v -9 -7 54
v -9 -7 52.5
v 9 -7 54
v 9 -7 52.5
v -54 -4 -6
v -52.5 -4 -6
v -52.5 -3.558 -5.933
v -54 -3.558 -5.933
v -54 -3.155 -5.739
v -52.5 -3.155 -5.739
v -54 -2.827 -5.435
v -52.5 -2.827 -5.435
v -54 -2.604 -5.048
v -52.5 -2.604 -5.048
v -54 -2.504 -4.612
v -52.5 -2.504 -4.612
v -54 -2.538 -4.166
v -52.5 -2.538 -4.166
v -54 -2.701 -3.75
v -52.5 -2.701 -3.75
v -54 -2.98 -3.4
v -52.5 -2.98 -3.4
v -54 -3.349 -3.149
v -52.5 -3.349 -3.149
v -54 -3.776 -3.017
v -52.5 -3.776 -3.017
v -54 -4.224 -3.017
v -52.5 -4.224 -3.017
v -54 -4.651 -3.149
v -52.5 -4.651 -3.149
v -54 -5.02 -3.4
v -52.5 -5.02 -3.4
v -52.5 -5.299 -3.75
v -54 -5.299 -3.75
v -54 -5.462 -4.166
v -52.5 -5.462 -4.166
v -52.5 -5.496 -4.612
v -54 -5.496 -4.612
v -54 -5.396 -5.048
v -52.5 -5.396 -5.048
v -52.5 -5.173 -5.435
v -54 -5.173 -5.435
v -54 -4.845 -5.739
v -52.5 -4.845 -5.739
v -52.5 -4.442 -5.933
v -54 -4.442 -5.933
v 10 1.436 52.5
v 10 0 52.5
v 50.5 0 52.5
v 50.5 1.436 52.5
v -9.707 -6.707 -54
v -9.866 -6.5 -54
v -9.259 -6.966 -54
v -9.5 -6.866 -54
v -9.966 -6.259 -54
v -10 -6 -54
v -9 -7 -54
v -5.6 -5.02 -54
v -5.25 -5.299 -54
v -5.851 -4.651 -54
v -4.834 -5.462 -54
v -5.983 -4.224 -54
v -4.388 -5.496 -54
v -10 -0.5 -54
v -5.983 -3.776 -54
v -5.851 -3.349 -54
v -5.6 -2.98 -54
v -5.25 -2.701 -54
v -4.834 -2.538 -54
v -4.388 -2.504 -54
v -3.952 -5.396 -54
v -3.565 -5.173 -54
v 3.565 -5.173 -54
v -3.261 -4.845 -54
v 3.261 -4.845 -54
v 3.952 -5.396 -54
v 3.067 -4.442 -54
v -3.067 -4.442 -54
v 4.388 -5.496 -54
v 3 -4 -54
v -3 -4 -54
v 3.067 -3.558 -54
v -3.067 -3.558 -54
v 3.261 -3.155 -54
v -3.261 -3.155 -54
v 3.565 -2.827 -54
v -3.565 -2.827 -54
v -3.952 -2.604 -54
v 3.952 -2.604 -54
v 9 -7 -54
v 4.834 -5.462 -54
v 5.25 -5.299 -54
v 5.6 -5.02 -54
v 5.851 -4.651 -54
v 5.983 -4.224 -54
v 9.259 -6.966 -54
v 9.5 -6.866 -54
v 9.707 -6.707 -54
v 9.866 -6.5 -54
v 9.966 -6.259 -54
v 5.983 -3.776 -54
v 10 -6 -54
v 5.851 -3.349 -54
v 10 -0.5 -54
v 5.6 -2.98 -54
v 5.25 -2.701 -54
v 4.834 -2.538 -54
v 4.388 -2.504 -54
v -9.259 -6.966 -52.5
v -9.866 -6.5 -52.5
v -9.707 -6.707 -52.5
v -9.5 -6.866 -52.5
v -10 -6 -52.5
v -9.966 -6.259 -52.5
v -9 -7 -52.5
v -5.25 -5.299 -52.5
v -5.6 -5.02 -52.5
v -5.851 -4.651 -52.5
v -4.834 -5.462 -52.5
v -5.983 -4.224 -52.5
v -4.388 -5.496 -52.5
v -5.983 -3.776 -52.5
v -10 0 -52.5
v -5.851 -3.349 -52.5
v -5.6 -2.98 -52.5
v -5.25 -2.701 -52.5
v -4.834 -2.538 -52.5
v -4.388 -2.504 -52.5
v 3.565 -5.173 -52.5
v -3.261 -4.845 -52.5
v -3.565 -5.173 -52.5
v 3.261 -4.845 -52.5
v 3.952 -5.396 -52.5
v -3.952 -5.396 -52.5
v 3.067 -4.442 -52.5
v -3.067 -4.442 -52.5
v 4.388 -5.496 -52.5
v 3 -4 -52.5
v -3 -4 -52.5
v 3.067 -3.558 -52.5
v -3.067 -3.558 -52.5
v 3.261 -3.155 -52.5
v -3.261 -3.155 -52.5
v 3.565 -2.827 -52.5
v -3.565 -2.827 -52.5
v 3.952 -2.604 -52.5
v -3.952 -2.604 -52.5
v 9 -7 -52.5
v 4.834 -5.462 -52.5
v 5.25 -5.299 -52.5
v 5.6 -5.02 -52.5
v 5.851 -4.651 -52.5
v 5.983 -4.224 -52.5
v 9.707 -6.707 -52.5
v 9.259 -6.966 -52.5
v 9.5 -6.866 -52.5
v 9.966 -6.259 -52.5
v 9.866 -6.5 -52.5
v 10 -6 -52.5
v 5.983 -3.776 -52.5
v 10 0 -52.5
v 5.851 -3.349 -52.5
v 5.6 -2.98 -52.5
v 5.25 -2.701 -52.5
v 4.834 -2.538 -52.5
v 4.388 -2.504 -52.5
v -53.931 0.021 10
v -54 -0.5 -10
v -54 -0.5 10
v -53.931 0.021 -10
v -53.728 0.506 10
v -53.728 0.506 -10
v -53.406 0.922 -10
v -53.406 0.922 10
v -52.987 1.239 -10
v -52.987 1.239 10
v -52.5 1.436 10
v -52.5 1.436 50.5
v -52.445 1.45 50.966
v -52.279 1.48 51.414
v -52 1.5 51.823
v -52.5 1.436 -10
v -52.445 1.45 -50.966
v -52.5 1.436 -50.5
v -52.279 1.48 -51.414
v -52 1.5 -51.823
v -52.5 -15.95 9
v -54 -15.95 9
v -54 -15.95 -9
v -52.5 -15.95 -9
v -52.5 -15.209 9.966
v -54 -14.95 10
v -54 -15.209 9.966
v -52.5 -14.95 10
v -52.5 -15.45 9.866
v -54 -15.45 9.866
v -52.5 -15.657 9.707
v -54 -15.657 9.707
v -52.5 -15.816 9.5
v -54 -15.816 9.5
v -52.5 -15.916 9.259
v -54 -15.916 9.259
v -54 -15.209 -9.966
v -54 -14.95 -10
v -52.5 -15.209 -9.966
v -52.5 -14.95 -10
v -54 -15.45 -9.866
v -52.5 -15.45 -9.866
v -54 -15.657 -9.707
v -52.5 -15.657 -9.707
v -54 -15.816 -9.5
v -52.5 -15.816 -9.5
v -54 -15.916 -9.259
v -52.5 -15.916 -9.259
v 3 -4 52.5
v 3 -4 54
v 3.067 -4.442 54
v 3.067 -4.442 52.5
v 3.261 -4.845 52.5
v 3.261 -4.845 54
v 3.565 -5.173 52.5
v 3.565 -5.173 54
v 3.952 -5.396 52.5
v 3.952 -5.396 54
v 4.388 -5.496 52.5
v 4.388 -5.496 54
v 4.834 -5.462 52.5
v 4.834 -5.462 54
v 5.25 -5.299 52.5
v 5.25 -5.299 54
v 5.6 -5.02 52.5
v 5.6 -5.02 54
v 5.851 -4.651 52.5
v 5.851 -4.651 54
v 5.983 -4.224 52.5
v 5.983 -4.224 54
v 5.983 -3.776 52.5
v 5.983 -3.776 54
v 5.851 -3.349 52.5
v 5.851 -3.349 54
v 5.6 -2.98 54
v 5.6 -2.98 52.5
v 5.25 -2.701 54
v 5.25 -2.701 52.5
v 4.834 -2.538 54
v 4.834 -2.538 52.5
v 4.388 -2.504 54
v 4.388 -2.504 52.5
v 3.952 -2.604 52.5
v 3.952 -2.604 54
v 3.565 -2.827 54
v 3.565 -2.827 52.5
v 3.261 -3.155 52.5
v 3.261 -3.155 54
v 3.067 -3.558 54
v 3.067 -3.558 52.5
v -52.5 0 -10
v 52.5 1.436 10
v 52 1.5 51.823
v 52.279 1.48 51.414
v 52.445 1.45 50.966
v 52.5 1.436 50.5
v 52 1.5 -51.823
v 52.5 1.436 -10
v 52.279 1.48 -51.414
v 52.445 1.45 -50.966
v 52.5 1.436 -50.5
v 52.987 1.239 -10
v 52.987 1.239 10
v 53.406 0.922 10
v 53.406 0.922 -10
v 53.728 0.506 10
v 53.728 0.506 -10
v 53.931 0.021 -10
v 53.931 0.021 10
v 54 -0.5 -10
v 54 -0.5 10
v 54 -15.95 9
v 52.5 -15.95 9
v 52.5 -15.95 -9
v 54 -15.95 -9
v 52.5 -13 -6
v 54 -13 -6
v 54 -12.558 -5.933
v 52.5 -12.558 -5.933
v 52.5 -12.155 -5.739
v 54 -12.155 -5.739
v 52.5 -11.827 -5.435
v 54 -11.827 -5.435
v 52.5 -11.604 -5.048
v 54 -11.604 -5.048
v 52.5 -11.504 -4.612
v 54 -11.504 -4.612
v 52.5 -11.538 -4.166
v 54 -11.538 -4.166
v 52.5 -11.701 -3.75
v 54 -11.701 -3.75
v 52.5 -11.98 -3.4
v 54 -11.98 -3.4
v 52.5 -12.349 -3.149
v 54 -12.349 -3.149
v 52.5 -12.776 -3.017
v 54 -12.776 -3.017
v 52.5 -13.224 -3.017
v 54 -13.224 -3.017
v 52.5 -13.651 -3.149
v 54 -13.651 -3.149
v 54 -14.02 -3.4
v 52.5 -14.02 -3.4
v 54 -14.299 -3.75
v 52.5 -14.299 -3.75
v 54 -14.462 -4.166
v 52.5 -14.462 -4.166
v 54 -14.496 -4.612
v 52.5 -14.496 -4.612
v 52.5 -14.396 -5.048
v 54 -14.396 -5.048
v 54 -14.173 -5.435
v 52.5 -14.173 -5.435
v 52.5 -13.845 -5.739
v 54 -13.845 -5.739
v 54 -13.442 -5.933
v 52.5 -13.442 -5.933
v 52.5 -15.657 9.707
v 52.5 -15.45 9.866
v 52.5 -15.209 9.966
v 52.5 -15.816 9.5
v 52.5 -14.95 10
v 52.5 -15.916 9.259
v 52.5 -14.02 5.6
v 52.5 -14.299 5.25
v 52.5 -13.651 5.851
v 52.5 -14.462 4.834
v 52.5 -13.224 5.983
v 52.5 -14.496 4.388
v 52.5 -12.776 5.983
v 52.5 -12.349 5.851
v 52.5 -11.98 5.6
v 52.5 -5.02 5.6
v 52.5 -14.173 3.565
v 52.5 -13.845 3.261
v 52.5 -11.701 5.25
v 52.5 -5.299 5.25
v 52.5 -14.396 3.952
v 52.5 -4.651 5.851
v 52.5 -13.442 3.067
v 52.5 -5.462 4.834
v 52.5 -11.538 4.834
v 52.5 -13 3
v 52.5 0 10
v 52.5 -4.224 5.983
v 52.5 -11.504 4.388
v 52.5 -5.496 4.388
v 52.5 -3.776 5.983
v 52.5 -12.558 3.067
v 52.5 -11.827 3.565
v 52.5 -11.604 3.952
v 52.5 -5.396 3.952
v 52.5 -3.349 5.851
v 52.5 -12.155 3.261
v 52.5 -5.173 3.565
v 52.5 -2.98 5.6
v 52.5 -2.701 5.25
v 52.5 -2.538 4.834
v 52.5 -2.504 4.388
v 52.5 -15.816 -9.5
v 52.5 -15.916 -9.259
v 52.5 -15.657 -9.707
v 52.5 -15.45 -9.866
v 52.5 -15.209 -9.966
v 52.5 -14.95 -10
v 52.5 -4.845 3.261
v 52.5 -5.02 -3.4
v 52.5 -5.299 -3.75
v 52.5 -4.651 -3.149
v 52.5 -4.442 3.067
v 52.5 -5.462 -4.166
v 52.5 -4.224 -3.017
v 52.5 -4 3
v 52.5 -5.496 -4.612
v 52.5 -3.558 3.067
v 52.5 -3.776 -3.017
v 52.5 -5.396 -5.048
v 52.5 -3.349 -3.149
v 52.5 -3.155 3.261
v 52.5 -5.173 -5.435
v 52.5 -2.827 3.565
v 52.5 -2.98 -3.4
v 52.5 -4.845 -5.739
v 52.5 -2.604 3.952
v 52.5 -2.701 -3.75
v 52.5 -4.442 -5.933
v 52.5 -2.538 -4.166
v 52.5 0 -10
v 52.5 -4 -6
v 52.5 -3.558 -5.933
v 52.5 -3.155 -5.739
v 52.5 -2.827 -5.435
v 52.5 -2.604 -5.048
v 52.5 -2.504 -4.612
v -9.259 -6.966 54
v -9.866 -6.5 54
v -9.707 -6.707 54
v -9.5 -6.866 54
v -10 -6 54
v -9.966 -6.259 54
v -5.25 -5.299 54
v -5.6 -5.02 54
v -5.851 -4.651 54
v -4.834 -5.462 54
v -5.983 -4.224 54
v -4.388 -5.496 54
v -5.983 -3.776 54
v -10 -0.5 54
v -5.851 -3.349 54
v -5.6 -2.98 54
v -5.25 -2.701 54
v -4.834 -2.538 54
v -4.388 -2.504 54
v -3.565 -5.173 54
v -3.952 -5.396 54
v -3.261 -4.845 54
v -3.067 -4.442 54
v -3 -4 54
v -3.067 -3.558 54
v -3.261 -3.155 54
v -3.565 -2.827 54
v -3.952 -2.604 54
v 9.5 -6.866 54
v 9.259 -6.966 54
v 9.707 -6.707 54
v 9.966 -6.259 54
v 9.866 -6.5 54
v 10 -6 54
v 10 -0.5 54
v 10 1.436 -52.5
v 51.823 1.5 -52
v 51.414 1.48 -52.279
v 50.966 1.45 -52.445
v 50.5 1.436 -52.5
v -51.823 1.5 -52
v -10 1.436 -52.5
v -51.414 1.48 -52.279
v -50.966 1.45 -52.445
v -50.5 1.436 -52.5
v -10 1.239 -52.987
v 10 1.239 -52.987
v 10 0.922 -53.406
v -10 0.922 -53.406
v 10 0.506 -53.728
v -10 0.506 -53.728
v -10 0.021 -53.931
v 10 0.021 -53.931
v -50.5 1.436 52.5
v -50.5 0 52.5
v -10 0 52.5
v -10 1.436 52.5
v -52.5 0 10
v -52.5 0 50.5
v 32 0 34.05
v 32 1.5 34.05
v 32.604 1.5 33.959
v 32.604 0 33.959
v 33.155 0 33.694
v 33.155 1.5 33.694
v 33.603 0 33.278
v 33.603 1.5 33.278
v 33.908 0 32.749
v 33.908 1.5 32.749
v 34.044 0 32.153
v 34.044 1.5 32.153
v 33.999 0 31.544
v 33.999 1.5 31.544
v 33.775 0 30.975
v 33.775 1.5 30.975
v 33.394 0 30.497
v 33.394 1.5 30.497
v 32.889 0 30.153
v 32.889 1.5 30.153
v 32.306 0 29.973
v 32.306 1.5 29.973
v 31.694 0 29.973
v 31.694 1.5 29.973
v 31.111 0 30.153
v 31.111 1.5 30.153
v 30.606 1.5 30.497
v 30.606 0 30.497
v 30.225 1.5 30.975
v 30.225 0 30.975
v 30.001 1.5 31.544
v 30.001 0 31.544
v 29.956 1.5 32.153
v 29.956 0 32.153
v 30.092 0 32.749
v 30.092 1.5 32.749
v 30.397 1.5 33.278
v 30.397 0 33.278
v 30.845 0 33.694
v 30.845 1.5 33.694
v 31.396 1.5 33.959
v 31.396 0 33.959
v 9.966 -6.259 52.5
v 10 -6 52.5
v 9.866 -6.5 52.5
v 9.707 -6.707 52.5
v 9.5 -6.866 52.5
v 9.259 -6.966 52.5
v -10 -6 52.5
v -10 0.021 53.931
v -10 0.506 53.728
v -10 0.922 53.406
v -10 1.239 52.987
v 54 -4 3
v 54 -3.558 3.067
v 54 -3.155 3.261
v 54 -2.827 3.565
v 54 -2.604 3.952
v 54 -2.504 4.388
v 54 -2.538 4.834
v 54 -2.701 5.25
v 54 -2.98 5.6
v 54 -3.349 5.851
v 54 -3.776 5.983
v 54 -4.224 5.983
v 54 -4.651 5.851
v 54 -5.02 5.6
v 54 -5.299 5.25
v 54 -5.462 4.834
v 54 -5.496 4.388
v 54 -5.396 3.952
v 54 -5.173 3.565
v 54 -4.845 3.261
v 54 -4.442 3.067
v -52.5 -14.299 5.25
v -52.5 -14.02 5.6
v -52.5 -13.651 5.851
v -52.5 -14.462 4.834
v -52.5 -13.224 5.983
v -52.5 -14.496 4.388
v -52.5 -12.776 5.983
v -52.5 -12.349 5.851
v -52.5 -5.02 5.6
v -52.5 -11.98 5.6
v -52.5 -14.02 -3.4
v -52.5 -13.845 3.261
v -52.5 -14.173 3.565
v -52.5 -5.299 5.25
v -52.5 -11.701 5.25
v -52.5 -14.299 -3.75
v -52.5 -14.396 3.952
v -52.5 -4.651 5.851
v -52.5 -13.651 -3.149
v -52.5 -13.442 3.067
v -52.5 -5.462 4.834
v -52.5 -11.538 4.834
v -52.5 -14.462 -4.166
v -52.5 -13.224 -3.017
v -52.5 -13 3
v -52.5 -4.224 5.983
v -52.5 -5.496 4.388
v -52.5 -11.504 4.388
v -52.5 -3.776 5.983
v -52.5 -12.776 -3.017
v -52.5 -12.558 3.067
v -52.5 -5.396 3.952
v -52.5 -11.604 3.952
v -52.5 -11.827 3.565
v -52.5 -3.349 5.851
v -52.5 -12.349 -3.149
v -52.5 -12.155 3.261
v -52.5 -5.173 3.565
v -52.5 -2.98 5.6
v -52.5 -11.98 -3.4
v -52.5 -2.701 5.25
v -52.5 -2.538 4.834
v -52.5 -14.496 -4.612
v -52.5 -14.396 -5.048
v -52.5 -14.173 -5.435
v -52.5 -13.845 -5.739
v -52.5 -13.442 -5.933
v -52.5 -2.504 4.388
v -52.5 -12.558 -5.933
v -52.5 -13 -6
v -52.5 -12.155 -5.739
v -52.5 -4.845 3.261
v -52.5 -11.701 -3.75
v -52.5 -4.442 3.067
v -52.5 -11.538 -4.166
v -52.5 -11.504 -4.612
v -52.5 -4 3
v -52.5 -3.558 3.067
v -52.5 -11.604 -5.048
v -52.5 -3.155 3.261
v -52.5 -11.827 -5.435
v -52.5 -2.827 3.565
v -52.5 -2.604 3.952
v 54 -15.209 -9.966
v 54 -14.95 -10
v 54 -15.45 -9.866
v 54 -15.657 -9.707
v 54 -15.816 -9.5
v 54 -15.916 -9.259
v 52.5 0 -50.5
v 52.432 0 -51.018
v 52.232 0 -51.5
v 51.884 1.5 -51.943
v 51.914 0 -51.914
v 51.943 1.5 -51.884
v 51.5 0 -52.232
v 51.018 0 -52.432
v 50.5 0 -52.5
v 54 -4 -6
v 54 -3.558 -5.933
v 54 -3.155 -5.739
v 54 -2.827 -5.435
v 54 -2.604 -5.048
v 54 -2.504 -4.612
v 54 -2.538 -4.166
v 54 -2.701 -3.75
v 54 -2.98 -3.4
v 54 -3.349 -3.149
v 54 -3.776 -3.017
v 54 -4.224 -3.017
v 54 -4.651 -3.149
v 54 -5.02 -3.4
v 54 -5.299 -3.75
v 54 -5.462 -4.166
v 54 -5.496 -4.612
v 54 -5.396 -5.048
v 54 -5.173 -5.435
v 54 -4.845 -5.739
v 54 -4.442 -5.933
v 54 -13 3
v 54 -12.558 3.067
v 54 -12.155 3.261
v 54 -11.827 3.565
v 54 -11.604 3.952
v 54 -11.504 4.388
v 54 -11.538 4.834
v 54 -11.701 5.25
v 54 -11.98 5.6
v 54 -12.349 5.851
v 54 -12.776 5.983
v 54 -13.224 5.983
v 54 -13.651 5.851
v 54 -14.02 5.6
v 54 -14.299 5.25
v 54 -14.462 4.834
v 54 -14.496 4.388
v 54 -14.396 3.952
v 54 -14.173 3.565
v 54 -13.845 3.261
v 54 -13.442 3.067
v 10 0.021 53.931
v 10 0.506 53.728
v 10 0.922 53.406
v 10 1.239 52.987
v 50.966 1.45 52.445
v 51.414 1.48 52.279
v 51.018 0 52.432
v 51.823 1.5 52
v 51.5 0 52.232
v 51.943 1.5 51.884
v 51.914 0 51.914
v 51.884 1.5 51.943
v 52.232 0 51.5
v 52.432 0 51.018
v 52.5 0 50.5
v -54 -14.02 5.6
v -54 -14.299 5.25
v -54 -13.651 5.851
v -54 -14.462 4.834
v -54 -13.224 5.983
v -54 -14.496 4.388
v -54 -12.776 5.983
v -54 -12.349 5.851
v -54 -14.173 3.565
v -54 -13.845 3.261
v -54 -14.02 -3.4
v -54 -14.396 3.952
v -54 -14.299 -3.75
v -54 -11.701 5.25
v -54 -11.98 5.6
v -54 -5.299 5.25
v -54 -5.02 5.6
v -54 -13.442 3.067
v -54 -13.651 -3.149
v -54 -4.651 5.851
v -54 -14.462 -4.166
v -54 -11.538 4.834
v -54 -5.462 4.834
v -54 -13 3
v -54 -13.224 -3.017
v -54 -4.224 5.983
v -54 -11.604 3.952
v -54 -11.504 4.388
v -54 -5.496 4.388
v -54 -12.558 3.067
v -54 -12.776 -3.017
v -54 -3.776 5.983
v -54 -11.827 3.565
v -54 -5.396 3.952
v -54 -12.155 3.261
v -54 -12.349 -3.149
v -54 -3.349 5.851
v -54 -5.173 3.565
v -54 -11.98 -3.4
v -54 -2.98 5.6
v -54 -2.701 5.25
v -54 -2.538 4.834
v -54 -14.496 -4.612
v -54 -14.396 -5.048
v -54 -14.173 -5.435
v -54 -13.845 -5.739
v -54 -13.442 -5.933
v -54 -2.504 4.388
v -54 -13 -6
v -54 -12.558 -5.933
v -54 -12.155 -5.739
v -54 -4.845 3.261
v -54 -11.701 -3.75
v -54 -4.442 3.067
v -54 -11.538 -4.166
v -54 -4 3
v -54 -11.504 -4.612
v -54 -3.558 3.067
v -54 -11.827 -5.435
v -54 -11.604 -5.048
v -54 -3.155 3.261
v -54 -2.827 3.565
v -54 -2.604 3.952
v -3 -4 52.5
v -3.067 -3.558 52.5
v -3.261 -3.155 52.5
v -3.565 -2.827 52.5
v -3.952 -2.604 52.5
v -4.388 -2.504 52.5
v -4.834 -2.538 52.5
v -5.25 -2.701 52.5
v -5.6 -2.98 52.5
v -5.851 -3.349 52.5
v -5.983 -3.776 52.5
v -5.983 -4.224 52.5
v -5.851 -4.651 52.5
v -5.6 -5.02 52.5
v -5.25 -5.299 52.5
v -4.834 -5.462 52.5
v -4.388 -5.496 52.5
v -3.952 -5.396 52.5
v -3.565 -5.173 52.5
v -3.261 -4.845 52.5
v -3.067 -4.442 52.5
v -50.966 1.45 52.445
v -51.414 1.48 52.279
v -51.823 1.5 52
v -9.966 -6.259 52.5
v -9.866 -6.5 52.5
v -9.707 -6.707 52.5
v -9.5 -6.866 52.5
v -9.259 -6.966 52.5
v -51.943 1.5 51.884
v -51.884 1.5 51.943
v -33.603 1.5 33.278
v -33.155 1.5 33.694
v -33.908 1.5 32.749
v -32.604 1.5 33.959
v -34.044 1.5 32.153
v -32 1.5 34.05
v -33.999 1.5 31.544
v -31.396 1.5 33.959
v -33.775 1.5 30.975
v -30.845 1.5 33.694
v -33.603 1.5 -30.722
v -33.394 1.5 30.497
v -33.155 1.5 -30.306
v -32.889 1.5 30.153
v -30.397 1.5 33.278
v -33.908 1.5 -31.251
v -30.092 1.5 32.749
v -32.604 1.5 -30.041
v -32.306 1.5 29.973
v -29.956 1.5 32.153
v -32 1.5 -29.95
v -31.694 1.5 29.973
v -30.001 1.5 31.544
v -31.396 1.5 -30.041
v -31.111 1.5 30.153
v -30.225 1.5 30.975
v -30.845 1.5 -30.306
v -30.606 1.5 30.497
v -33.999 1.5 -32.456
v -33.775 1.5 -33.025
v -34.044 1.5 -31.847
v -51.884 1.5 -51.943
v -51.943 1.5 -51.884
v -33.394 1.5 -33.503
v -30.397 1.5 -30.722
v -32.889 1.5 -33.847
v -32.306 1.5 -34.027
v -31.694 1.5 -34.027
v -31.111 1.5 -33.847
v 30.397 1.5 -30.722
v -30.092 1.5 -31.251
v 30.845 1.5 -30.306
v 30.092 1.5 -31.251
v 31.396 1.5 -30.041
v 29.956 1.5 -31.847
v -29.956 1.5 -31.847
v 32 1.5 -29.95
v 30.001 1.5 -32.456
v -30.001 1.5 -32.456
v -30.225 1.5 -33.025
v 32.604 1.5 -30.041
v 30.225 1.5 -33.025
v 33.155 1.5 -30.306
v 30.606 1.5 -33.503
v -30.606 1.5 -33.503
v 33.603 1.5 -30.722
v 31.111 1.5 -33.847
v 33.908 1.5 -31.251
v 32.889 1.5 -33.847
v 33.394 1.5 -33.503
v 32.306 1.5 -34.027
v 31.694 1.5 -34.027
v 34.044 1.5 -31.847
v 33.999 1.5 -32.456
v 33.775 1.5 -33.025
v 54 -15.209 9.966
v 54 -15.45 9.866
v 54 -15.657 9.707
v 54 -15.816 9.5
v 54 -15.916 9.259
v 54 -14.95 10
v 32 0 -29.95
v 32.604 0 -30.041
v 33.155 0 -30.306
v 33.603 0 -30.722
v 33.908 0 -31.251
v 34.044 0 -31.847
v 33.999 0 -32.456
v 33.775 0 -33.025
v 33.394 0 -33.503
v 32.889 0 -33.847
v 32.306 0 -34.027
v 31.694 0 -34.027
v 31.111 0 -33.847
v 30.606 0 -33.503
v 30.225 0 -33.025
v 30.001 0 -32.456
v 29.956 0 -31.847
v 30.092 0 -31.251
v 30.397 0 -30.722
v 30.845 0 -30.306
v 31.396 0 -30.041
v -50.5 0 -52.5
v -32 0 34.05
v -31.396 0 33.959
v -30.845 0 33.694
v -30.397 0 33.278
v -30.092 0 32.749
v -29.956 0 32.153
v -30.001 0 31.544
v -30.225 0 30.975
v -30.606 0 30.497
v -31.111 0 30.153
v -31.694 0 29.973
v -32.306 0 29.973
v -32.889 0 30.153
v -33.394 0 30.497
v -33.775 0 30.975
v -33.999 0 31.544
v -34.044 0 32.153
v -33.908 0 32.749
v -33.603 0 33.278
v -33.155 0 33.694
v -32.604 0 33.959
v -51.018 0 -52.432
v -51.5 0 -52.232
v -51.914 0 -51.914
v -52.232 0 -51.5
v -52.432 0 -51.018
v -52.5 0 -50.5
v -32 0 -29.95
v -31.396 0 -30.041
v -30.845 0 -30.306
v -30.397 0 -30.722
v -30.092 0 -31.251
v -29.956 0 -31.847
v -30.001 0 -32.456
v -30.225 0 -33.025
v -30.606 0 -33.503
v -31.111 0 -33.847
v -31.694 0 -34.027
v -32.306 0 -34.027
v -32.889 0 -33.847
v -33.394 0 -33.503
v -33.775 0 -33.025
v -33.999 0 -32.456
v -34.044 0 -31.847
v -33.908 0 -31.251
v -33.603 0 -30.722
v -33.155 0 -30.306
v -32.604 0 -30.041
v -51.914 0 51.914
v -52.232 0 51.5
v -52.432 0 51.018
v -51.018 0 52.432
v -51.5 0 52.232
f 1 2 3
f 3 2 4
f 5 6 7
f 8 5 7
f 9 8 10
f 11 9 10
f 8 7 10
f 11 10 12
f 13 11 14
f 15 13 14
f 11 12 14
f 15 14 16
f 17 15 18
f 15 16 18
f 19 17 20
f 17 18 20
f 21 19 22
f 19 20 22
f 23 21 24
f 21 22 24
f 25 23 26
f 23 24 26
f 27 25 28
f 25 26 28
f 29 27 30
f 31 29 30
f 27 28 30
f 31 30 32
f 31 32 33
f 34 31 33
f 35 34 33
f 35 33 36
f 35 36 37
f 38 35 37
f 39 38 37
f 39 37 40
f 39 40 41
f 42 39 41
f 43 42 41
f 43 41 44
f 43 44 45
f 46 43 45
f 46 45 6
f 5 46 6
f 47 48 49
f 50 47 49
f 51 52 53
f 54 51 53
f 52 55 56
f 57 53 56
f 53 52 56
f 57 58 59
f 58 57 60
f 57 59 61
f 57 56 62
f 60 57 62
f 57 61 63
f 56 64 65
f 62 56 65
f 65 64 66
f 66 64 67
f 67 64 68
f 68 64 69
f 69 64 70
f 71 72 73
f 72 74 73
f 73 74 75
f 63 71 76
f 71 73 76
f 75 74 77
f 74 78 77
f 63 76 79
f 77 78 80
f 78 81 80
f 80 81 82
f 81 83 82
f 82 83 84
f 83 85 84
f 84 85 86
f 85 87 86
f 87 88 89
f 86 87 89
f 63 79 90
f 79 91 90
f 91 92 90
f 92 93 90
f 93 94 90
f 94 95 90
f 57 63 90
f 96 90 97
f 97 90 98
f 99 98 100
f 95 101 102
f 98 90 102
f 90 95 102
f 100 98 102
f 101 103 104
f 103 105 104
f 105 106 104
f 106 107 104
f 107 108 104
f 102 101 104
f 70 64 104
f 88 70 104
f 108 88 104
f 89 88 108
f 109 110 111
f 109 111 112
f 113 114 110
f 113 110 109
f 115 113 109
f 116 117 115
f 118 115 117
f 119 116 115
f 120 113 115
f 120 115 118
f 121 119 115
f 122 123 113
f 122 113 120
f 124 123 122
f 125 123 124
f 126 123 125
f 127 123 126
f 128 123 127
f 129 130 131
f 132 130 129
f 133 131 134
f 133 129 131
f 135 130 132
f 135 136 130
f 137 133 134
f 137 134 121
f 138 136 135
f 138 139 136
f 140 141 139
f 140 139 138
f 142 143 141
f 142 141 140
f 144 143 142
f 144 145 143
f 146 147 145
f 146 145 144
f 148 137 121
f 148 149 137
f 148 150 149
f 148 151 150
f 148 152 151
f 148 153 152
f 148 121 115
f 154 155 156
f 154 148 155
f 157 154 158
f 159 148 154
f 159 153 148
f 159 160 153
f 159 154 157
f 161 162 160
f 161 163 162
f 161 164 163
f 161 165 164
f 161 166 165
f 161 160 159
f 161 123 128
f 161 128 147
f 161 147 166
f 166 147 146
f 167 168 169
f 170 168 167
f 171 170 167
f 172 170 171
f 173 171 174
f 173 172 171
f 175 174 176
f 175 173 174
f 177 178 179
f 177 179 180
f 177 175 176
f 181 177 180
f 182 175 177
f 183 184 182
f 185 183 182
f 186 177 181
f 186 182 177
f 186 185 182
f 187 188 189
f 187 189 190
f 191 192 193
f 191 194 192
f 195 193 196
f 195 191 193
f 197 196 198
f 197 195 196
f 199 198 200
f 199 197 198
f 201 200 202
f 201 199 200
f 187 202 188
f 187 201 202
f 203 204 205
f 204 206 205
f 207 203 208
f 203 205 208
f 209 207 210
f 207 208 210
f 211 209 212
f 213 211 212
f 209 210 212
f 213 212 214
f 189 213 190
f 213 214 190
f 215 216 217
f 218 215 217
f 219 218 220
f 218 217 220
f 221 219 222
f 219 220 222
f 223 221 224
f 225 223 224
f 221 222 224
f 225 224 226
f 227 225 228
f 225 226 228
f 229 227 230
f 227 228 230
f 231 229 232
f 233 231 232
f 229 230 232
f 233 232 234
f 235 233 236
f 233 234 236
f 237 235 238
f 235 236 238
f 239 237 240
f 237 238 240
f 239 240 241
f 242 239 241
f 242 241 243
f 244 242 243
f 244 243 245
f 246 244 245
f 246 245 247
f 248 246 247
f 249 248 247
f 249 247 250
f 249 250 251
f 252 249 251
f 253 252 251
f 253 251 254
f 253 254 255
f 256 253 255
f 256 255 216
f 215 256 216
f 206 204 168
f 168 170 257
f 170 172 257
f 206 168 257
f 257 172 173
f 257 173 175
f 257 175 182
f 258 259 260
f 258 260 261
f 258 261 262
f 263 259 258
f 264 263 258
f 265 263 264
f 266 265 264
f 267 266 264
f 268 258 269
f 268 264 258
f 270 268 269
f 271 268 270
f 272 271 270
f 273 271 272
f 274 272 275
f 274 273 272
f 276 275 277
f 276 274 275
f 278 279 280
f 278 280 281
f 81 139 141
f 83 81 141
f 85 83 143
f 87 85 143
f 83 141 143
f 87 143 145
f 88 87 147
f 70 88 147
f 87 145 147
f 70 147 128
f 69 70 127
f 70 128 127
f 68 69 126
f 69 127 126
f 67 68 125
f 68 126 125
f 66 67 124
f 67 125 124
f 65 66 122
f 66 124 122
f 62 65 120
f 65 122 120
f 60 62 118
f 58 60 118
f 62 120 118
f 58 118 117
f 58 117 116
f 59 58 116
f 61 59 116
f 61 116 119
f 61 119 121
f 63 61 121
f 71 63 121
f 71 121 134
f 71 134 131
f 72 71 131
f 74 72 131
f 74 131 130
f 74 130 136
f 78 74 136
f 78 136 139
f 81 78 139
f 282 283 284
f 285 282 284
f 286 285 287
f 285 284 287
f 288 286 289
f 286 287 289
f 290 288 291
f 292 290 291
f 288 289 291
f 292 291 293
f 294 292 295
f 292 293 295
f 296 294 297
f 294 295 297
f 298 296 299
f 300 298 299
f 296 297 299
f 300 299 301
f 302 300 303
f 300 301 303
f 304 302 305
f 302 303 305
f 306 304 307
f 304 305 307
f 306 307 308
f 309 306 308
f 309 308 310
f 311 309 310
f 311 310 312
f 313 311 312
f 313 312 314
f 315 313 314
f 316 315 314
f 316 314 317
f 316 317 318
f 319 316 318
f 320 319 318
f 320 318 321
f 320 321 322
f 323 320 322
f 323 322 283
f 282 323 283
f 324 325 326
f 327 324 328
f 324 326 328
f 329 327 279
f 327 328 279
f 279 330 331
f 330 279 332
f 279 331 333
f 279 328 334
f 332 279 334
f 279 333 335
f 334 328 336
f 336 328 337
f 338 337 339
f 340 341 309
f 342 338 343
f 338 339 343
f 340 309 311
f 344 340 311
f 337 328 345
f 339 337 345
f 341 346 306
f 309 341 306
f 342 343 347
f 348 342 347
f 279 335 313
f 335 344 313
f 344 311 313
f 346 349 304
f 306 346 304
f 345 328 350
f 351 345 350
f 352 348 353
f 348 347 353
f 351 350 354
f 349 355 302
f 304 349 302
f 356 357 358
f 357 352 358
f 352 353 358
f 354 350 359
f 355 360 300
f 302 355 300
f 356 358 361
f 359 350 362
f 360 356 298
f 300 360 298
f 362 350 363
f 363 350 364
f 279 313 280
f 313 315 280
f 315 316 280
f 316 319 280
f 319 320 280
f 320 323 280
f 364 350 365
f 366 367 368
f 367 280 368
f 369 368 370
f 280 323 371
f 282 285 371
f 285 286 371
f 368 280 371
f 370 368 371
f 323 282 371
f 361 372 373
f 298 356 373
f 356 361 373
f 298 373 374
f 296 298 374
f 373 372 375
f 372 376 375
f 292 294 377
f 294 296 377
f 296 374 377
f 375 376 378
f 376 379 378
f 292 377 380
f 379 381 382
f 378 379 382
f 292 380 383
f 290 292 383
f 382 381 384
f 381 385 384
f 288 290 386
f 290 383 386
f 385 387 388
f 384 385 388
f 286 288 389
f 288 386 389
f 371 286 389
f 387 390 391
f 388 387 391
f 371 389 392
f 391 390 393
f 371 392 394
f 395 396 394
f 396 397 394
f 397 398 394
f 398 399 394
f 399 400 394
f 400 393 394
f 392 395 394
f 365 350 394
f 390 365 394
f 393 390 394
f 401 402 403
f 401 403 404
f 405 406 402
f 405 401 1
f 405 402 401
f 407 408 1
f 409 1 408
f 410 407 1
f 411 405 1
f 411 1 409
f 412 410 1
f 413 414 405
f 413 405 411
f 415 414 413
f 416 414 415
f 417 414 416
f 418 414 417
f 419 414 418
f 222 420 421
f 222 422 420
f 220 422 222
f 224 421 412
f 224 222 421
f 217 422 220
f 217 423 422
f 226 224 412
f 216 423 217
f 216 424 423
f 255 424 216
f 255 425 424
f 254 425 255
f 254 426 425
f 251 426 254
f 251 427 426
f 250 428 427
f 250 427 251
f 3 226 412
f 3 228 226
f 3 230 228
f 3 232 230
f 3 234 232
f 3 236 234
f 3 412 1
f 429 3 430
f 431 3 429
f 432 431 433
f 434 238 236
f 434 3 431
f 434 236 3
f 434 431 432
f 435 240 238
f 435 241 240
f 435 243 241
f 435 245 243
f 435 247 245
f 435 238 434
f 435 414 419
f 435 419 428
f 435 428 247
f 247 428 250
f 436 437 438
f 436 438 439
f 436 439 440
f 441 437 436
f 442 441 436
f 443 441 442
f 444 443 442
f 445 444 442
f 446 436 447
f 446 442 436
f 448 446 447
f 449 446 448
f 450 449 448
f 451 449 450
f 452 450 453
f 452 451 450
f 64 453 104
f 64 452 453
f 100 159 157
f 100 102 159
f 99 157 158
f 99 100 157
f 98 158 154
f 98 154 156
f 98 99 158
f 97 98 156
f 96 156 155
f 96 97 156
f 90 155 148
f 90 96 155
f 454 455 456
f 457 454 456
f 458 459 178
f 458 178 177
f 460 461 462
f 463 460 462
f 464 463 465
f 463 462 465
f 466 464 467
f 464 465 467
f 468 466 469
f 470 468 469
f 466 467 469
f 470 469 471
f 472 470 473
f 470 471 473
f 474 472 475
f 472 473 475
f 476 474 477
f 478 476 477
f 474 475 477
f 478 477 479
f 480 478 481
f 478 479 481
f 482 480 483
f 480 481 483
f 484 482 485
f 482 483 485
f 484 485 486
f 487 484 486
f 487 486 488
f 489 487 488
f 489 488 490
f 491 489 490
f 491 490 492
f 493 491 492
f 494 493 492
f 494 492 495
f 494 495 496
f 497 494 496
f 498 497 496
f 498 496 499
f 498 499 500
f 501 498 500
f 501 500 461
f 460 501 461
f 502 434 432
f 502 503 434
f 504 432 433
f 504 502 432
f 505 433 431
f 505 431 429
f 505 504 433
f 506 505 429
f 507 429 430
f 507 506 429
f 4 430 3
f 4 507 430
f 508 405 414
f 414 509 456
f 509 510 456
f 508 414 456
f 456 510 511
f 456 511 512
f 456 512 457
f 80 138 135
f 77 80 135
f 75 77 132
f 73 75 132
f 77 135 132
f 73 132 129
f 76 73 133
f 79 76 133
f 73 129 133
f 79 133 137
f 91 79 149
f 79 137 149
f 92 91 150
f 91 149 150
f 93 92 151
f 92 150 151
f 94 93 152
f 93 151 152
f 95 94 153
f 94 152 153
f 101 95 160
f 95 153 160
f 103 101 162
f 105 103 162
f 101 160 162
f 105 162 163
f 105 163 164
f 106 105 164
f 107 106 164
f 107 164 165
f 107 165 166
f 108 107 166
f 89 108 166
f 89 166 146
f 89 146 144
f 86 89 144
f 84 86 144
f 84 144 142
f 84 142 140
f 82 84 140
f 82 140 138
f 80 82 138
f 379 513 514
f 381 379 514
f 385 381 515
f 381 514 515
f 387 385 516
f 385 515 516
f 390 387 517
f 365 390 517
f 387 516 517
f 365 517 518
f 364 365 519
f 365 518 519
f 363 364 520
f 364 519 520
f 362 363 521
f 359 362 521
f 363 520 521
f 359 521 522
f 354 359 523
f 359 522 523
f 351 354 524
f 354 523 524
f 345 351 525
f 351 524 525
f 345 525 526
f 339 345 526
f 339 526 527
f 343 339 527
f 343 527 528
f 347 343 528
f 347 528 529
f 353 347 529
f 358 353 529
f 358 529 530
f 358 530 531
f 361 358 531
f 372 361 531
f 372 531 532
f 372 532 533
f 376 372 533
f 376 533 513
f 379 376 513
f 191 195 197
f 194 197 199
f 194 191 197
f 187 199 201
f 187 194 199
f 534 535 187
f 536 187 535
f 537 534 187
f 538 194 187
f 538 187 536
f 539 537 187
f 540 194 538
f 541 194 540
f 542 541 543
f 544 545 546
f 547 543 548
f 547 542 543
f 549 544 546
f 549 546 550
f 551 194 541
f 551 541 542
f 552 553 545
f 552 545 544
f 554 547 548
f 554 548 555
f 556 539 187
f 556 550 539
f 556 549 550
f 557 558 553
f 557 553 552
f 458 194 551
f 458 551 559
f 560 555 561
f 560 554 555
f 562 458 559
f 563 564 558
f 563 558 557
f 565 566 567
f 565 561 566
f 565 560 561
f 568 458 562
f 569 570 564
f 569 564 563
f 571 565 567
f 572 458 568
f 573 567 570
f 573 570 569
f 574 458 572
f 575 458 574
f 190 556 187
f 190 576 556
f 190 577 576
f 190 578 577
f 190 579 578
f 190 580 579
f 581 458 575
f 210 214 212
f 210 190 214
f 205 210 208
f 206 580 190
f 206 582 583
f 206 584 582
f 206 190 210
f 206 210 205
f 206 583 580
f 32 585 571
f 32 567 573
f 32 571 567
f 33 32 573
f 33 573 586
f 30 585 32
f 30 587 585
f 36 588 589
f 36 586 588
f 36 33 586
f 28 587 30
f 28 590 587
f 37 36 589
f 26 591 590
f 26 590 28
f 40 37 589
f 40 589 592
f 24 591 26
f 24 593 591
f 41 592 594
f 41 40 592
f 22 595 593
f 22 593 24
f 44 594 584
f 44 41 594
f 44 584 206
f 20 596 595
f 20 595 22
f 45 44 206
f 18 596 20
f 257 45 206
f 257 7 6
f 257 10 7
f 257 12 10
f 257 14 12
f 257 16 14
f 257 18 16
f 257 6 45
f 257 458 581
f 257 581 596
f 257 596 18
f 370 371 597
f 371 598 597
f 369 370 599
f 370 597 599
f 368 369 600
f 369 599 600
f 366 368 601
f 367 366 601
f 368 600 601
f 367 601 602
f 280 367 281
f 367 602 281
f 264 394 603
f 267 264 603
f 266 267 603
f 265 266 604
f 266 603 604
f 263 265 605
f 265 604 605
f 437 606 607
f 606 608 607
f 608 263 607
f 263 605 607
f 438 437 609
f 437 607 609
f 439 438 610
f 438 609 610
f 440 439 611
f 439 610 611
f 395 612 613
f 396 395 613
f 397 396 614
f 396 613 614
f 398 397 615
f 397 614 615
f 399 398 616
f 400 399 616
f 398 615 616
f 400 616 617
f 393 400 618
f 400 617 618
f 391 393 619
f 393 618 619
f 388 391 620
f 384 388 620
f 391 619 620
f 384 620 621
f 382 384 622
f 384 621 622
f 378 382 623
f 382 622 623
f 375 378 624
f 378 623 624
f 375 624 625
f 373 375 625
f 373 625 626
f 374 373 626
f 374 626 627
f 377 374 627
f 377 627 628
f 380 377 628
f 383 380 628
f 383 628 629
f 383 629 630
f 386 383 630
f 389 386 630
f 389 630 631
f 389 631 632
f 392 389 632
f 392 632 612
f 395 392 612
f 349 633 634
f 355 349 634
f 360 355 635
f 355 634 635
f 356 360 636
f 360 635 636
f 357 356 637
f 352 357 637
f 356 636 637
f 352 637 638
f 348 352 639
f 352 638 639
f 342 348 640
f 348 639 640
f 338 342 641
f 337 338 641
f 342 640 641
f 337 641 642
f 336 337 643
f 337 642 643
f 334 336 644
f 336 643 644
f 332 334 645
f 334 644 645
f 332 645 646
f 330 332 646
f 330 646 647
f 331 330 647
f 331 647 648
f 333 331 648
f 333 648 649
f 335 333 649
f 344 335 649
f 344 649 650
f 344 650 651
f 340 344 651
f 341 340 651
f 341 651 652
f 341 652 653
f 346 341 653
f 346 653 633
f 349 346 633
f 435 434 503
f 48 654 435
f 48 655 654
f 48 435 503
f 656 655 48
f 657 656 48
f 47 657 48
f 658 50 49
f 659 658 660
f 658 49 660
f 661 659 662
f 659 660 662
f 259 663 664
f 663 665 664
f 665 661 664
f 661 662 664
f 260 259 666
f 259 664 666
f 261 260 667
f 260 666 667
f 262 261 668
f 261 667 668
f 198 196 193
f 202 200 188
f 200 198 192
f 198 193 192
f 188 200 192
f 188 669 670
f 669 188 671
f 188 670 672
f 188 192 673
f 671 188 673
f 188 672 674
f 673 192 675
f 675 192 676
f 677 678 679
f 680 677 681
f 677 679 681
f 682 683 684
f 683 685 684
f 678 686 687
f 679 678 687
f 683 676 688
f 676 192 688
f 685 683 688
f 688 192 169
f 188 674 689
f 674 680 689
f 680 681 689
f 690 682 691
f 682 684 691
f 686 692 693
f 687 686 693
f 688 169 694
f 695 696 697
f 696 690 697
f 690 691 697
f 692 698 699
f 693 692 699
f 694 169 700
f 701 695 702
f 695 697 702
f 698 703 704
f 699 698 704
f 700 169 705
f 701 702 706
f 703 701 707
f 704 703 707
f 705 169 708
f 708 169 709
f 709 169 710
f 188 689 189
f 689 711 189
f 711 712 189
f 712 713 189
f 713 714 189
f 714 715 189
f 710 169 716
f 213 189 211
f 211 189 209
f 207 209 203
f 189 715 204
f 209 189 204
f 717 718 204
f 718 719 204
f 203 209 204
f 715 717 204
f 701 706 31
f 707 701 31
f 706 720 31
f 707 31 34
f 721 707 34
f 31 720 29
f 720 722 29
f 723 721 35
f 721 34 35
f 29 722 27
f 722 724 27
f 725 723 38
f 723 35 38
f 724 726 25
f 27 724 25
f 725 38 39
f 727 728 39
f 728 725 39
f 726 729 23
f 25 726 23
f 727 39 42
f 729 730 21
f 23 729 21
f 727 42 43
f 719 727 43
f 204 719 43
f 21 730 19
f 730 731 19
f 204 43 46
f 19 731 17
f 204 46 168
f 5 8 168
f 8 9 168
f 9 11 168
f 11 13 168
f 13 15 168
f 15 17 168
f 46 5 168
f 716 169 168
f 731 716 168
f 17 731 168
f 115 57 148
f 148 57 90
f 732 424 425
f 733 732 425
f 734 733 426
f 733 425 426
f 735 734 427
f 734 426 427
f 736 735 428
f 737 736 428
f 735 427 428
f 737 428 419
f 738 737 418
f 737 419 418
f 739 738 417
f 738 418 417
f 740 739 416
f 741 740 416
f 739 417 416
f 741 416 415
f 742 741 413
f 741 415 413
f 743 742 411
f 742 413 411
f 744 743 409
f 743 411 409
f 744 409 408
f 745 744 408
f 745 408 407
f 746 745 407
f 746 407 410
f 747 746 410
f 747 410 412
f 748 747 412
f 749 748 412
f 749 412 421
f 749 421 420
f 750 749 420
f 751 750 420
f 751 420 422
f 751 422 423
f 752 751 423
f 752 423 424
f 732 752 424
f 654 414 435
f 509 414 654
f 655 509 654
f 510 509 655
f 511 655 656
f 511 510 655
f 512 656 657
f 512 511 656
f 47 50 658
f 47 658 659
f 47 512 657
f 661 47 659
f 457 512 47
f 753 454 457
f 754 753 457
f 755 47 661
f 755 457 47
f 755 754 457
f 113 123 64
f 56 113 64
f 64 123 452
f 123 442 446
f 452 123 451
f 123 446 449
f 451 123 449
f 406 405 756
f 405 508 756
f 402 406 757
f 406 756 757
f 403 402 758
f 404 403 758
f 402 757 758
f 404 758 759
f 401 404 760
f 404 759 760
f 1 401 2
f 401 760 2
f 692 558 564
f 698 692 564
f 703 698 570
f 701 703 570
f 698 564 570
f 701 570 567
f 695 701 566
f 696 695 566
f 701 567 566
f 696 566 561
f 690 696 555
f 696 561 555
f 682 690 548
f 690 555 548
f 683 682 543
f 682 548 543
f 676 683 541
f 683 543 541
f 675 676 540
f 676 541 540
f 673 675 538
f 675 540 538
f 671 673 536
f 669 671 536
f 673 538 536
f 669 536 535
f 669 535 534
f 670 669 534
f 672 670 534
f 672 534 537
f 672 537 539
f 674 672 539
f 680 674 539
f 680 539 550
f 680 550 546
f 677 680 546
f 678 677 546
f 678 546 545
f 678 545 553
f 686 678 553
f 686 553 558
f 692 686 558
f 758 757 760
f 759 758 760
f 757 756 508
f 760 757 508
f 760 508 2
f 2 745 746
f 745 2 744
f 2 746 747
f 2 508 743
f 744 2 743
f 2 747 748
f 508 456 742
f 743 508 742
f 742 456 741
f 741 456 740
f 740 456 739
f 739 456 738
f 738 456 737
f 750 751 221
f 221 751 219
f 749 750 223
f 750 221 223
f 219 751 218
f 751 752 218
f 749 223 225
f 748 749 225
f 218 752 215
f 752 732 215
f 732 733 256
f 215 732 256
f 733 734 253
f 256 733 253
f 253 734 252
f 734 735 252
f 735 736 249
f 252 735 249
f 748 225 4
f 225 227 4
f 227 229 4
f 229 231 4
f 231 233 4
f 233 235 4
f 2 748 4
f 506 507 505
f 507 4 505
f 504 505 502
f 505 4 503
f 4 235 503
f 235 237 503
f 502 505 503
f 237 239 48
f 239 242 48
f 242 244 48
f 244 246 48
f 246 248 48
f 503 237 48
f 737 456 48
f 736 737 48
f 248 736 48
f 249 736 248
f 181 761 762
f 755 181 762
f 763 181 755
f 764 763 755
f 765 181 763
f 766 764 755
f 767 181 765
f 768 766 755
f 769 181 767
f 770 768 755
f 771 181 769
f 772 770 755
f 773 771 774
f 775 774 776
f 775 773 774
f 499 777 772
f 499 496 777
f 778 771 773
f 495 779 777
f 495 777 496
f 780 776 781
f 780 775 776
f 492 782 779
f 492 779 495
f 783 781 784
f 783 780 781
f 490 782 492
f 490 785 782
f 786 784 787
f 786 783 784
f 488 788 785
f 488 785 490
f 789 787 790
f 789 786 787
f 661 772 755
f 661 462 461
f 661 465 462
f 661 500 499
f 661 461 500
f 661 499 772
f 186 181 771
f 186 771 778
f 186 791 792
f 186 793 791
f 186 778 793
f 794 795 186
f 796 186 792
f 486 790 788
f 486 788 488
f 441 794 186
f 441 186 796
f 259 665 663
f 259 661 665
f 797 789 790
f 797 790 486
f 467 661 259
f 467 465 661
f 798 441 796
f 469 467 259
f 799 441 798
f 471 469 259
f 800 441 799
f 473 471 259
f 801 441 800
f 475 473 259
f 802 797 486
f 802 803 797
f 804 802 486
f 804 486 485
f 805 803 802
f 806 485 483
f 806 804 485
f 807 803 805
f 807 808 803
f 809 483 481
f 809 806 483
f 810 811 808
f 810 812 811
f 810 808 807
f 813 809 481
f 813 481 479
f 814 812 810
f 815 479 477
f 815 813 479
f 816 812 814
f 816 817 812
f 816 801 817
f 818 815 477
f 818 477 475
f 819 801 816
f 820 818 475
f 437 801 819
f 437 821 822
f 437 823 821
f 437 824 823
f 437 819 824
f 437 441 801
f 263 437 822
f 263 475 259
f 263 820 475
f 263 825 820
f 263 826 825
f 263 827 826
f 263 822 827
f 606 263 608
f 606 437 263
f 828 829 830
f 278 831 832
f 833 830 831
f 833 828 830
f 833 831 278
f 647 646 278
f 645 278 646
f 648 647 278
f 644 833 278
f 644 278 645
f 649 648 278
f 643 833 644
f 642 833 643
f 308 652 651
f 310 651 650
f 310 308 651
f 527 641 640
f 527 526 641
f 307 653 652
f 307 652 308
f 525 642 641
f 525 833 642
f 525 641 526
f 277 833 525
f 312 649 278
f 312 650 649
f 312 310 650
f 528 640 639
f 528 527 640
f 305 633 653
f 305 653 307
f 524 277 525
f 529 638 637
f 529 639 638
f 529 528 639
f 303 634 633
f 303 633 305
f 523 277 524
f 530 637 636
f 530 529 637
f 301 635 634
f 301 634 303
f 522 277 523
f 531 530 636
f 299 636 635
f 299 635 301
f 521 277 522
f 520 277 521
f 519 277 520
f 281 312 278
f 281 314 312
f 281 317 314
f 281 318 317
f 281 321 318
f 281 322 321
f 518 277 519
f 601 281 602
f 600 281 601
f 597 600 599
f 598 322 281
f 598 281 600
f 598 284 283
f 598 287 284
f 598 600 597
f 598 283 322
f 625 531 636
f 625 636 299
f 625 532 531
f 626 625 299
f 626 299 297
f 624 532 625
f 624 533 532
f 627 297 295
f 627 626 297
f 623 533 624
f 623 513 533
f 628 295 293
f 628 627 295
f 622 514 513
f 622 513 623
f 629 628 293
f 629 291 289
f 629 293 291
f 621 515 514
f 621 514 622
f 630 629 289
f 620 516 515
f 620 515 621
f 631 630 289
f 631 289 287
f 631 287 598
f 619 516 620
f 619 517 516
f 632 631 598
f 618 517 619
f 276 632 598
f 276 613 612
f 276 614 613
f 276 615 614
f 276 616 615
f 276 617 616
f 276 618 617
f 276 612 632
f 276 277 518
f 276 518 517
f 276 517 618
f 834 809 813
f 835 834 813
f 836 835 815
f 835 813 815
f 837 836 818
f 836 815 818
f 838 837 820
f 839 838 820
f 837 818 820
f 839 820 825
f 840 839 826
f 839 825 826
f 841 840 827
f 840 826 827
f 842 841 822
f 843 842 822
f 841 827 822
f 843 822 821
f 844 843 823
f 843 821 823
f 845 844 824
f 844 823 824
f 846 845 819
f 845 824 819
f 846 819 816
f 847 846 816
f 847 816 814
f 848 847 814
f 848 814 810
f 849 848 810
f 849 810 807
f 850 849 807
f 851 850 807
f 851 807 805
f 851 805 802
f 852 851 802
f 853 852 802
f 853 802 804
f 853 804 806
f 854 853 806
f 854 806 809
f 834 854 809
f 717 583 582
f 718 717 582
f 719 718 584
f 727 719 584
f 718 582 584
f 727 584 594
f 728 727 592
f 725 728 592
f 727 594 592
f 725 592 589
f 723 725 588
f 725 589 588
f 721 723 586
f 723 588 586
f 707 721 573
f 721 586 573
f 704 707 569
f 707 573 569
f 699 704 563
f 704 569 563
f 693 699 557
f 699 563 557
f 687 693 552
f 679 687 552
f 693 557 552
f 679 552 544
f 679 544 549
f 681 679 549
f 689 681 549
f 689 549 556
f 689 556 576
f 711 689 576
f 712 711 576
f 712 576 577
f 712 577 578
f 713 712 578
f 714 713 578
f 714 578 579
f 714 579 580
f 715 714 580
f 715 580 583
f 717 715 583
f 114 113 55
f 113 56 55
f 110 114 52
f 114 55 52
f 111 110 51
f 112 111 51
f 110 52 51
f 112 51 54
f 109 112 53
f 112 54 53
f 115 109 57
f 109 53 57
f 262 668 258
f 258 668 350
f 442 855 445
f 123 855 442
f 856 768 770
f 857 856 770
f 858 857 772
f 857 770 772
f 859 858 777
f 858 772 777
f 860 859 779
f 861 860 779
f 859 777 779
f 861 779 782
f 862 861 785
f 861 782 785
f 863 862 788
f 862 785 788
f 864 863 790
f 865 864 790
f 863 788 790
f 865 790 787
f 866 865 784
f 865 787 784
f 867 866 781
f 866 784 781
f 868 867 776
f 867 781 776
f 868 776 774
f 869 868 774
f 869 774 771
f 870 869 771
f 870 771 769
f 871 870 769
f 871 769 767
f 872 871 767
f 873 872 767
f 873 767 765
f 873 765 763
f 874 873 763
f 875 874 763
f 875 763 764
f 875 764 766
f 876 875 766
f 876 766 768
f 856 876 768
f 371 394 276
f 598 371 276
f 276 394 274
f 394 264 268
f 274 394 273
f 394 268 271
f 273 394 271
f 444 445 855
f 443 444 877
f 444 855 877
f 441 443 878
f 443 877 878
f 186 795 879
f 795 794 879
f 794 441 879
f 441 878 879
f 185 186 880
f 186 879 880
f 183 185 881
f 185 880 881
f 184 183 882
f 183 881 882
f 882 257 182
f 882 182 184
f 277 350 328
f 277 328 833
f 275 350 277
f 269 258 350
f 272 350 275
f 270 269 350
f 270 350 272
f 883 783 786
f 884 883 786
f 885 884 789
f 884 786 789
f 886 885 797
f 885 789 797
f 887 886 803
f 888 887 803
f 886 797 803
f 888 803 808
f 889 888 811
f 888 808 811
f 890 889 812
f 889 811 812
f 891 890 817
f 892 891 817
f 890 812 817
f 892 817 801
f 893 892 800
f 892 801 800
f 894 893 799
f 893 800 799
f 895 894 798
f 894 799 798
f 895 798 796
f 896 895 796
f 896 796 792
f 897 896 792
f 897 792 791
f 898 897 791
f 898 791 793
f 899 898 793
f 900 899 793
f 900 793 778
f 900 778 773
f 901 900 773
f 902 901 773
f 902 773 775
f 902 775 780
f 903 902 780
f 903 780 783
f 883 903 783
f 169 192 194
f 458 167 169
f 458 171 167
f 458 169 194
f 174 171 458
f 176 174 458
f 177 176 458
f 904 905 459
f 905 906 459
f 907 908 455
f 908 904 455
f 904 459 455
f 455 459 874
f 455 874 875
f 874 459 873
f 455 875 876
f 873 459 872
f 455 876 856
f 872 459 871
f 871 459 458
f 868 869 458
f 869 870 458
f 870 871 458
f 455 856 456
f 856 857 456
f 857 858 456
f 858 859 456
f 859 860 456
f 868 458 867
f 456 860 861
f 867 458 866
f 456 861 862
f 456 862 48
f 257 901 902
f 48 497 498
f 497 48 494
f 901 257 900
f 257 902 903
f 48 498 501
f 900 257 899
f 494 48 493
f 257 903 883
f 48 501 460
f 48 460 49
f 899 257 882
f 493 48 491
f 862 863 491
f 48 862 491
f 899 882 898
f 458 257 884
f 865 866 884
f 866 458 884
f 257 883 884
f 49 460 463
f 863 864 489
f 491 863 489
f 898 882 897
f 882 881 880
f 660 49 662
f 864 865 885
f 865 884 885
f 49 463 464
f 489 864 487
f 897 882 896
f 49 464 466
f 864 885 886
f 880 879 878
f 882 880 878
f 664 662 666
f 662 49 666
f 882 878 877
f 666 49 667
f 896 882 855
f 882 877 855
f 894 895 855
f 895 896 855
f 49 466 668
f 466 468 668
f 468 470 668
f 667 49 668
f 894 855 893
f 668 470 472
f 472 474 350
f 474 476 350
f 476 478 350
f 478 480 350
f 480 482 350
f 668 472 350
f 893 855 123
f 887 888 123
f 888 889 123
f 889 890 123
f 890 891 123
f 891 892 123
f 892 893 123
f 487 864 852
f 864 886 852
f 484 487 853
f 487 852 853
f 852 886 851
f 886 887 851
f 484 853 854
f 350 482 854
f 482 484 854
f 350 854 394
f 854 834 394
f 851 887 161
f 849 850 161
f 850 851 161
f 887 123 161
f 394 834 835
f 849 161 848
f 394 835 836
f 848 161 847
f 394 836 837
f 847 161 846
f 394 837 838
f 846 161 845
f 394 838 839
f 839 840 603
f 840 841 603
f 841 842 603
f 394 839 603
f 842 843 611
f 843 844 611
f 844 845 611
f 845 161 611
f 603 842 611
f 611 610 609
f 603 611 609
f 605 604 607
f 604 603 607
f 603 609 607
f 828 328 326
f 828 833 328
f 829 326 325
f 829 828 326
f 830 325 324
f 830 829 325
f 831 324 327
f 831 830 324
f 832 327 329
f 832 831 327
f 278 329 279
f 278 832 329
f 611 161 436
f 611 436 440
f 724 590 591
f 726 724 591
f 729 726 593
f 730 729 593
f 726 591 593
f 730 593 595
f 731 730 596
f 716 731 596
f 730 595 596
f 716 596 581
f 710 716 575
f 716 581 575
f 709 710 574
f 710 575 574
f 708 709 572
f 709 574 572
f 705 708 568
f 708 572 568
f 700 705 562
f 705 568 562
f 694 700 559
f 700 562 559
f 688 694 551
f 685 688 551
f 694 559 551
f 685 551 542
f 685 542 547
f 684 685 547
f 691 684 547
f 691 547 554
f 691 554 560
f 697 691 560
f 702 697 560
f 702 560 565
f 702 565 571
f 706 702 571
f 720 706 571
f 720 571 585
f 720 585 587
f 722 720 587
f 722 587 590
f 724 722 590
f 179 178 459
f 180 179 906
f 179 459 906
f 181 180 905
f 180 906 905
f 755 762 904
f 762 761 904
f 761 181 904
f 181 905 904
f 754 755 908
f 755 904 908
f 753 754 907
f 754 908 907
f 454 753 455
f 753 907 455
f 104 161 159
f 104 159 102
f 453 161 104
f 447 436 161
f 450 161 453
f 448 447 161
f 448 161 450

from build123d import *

# Parameters (mm, degrees)
SKETCH1_W                     = 105
SKETCH1_H                     = 105
BOSS_EXTRUDE1_DEPTH           = 1.5
SKETCH2_W                     = 20
SKETCH2_H                     = 1.5
BOSS_EXTRUDE2_DEPTH           = 8.5
SKETCH3_W                     = 1.5
SKETCH3_H                     = 20
BOSS_EXTRUDE3_DEPTH           = 17.45
SKETCH4_R                     = 1.5
CUT_EXTRUDE1_DEPTH            = 122.796561938
SKETCH5_R                     = 1.5
CUT_EXTRUDE2_DEPTH            = 122.796561938
FILLET1_R                     = 1
FILLET2_START                 = -53.84589
FILLET2_DEPTH                 = 107.69178
FILLET2_START_2               = -53
FILLET2_2_DEPTH               = 106
FILLET3_R                     = 2
SKETCH6_R                     = 2.05
HOLES_FOR_BULKHEAD_RODS_DEPTH = 10


with BuildPart() as part:
    # Sketch1 → Boss-Extrude1 (new body)
    with BuildSketch(Plane(origin=(0, 0, 0), x_dir=(1, 0, 0), z_dir=(0, 1, 0))):
        Rectangle(SKETCH1_W, SKETCH1_H)
    extrude(amount=BOSS_EXTRUDE1_DEPTH)

    # Sketch2 → Boss-Extrude2 (add)
    with BuildSketch(Plane(origin=(0, 1.5, 0), x_dir=(1, 0, 0), z_dir=(0, 1, 0))):
        with Locations((0, 53.25)):
            Rectangle(SKETCH2_W, SKETCH2_H)
        with Locations((0, -53.25)):
            Rectangle(SKETCH2_W, SKETCH2_H)
    extrude(amount=-BOSS_EXTRUDE2_DEPTH)

    # Sketch3 → Boss-Extrude3 (add)
    with BuildSketch(Plane(origin=(0, 1.5, 0), x_dir=(1, 0, 0), z_dir=(0, 1, 0))):
        with Locations((53.25, 0)):
            Rectangle(SKETCH3_W, SKETCH3_H)
        with Locations((-53.25, 0)):
            Rectangle(SKETCH3_W, SKETCH3_H)
    extrude(amount=-BOSS_EXTRUDE3_DEPTH)

    # Sketch4 → Cut-Extrude1 (cut, through all)
    with BuildSketch(Plane.XY.offset(54)):
        with Locations((-4.5, -4)):
            Circle(SKETCH4_R)
        with Locations(Location((4.5, -4, 0), (0, 0, 180))):
            Circle(SKETCH4_R)
    extrude(amount=-CUT_EXTRUDE1_DEPTH, mode=Mode.SUBTRACT)

    # Sketch5 → Cut-Extrude2 (cut, through all)
    with BuildSketch(Plane(origin=(54, 0, 0), x_dir=(0, 0, -1), z_dir=(1, 0, 0))):
        with Locations((-4.5, -4)):
            Circle(SKETCH5_R)
        with Locations((4.5, -4)):
            Circle(SKETCH5_R)
        with Locations((4.5, -13)):
            Circle(SKETCH5_R)
        with Locations((-4.5, -13)):
            Circle(SKETCH5_R)
    extrude(amount=-CUT_EXTRUDE2_DEPTH, mode=Mode.SUBTRACT)

    # Fillet1
    fillet1_edges = [part.edges().sort_by_distance(p)[0] for p in [
        (-10, -7, -53.25),
        (10, -7, -53.25),
        (-10, -7, 53.25),
        (10, -7, 53.25),
        (53.25, -15.95, -10),
        (53.25, -15.95, 10),
        (-53.25, -15.95, 10),
        (-53.25, -15.95, -10),
    ]]
    fillet(fillet1_edges, radius=FILLET1_R)

    # Fillet2: read off the stored shape, not the designer's step
    # Fillet2 outline → Fillet2 (cut)
    with BuildSketch(Plane.XY.offset(FILLET2_START)):
        with BuildLine():
            ThreePointArc((52, 1.5), (53.414213562, 0.914213562), (54, -0.5))
            Line((54, -0.5), (54, 1.5))
            Line((54, 1.5), (52, 1.5))
        make_face()
        with BuildLine():
            Line((-52, 1.5), (-54, 1.5))
            Line((-54, 1.5), (-54, -0.5))
            ThreePointArc((-54, -0.5), (-53.414213562, 0.914213562), (-52, 1.5))
        make_face()
    extrude(amount=FILLET2_DEPTH, mode=Mode.SUBTRACT)

    # Fillet2 2 outline → Fillet2 2 (cut)
    with BuildSketch(Plane.YZ.offset(FILLET2_START_2)):
        with BuildLine():
            ThreePointArc((1.5, -52), (0.914213562, -53.414213562), (-0.5, -54))
            Line((-0.5, -54), (1.5, -54))
            Line((1.5, -54), (1.5, -52))
        make_face()
        with BuildLine():
            Line((1.5, 52), (1.5, 54))
            Line((1.5, 54), (-0.5, 54))
            ThreePointArc((-0.5, 54), (0.914213562, 53.414213562), (1.5, 52))
        make_face()
    extrude(amount=FILLET2_2_DEPTH, mode=Mode.SUBTRACT)

    # Fillet3
    # the kernel refuses this fillet: 2 mm, written as the material it takes off along each edge
    with BuildSketch(Plane(origin=(52.5, -5, -52.5), x_dir=(0, 0, 1), z_dir=(0, 1, 0)), Plane(origin=(52.5, -5, 52.5), x_dir=(-1, 0, 0), z_dir=(0, 1, 0)), Plane(origin=(-52.5, -5, -52.5), x_dir=(1, 0, 0), z_dir=(0, 1, 0))) as fillet3_piece_1:
        with BuildLine():
            CenterArc((FILLET3_R, -FILLET3_R), FILLET3_R, 90, 90)
            Line((0, -FILLET3_R), (0, 0))
            Line((0, 0), (FILLET3_R, 0))
        make_face()
    extrude(amount=11.436491673, mode=Mode.SUBTRACT)
    with BuildSketch(Plane(origin=(-52.5, -5, 52.5), x_dir=(1, 0, 0), z_dir=(0, 1, 0))) as fillet3_piece_2:
        with BuildLine():
            CenterArc((FILLET3_R, FILLET3_R), FILLET3_R, 180, 90)
            Line((0, FILLET3_R), (0, 0))
            Line((0, 0), (FILLET3_R, 0))
        make_face()
    extrude(amount=11.436491673, mode=Mode.SUBTRACT)

    # Sketch6 → Holes for Bulkhead Rods (cut)
    with BuildSketch(Plane(origin=(0, 1.5, 0), x_dir=(1, 0, 0), z_dir=(0, 1, 0))):
        with Locations(Location((-32, 32, 0), (0, 0, 270))):
            Circle(SKETCH6_R)
        with Locations(Location((32, 32, 0), (0, 0, 270))):
            Circle(SKETCH6_R)
        with Locations(Location((-32, -32, 0), (0, 0, 270))):
            Circle(SKETCH6_R)
        with Locations(Location((32, -32, 0), (0, 0, 270))):
            Circle(SKETCH6_R)
    extrude(amount=-HOLES_FOR_BULKHEAD_RODS_DEPTH, mode=Mode.SUBTRACT)


solid = part.part
